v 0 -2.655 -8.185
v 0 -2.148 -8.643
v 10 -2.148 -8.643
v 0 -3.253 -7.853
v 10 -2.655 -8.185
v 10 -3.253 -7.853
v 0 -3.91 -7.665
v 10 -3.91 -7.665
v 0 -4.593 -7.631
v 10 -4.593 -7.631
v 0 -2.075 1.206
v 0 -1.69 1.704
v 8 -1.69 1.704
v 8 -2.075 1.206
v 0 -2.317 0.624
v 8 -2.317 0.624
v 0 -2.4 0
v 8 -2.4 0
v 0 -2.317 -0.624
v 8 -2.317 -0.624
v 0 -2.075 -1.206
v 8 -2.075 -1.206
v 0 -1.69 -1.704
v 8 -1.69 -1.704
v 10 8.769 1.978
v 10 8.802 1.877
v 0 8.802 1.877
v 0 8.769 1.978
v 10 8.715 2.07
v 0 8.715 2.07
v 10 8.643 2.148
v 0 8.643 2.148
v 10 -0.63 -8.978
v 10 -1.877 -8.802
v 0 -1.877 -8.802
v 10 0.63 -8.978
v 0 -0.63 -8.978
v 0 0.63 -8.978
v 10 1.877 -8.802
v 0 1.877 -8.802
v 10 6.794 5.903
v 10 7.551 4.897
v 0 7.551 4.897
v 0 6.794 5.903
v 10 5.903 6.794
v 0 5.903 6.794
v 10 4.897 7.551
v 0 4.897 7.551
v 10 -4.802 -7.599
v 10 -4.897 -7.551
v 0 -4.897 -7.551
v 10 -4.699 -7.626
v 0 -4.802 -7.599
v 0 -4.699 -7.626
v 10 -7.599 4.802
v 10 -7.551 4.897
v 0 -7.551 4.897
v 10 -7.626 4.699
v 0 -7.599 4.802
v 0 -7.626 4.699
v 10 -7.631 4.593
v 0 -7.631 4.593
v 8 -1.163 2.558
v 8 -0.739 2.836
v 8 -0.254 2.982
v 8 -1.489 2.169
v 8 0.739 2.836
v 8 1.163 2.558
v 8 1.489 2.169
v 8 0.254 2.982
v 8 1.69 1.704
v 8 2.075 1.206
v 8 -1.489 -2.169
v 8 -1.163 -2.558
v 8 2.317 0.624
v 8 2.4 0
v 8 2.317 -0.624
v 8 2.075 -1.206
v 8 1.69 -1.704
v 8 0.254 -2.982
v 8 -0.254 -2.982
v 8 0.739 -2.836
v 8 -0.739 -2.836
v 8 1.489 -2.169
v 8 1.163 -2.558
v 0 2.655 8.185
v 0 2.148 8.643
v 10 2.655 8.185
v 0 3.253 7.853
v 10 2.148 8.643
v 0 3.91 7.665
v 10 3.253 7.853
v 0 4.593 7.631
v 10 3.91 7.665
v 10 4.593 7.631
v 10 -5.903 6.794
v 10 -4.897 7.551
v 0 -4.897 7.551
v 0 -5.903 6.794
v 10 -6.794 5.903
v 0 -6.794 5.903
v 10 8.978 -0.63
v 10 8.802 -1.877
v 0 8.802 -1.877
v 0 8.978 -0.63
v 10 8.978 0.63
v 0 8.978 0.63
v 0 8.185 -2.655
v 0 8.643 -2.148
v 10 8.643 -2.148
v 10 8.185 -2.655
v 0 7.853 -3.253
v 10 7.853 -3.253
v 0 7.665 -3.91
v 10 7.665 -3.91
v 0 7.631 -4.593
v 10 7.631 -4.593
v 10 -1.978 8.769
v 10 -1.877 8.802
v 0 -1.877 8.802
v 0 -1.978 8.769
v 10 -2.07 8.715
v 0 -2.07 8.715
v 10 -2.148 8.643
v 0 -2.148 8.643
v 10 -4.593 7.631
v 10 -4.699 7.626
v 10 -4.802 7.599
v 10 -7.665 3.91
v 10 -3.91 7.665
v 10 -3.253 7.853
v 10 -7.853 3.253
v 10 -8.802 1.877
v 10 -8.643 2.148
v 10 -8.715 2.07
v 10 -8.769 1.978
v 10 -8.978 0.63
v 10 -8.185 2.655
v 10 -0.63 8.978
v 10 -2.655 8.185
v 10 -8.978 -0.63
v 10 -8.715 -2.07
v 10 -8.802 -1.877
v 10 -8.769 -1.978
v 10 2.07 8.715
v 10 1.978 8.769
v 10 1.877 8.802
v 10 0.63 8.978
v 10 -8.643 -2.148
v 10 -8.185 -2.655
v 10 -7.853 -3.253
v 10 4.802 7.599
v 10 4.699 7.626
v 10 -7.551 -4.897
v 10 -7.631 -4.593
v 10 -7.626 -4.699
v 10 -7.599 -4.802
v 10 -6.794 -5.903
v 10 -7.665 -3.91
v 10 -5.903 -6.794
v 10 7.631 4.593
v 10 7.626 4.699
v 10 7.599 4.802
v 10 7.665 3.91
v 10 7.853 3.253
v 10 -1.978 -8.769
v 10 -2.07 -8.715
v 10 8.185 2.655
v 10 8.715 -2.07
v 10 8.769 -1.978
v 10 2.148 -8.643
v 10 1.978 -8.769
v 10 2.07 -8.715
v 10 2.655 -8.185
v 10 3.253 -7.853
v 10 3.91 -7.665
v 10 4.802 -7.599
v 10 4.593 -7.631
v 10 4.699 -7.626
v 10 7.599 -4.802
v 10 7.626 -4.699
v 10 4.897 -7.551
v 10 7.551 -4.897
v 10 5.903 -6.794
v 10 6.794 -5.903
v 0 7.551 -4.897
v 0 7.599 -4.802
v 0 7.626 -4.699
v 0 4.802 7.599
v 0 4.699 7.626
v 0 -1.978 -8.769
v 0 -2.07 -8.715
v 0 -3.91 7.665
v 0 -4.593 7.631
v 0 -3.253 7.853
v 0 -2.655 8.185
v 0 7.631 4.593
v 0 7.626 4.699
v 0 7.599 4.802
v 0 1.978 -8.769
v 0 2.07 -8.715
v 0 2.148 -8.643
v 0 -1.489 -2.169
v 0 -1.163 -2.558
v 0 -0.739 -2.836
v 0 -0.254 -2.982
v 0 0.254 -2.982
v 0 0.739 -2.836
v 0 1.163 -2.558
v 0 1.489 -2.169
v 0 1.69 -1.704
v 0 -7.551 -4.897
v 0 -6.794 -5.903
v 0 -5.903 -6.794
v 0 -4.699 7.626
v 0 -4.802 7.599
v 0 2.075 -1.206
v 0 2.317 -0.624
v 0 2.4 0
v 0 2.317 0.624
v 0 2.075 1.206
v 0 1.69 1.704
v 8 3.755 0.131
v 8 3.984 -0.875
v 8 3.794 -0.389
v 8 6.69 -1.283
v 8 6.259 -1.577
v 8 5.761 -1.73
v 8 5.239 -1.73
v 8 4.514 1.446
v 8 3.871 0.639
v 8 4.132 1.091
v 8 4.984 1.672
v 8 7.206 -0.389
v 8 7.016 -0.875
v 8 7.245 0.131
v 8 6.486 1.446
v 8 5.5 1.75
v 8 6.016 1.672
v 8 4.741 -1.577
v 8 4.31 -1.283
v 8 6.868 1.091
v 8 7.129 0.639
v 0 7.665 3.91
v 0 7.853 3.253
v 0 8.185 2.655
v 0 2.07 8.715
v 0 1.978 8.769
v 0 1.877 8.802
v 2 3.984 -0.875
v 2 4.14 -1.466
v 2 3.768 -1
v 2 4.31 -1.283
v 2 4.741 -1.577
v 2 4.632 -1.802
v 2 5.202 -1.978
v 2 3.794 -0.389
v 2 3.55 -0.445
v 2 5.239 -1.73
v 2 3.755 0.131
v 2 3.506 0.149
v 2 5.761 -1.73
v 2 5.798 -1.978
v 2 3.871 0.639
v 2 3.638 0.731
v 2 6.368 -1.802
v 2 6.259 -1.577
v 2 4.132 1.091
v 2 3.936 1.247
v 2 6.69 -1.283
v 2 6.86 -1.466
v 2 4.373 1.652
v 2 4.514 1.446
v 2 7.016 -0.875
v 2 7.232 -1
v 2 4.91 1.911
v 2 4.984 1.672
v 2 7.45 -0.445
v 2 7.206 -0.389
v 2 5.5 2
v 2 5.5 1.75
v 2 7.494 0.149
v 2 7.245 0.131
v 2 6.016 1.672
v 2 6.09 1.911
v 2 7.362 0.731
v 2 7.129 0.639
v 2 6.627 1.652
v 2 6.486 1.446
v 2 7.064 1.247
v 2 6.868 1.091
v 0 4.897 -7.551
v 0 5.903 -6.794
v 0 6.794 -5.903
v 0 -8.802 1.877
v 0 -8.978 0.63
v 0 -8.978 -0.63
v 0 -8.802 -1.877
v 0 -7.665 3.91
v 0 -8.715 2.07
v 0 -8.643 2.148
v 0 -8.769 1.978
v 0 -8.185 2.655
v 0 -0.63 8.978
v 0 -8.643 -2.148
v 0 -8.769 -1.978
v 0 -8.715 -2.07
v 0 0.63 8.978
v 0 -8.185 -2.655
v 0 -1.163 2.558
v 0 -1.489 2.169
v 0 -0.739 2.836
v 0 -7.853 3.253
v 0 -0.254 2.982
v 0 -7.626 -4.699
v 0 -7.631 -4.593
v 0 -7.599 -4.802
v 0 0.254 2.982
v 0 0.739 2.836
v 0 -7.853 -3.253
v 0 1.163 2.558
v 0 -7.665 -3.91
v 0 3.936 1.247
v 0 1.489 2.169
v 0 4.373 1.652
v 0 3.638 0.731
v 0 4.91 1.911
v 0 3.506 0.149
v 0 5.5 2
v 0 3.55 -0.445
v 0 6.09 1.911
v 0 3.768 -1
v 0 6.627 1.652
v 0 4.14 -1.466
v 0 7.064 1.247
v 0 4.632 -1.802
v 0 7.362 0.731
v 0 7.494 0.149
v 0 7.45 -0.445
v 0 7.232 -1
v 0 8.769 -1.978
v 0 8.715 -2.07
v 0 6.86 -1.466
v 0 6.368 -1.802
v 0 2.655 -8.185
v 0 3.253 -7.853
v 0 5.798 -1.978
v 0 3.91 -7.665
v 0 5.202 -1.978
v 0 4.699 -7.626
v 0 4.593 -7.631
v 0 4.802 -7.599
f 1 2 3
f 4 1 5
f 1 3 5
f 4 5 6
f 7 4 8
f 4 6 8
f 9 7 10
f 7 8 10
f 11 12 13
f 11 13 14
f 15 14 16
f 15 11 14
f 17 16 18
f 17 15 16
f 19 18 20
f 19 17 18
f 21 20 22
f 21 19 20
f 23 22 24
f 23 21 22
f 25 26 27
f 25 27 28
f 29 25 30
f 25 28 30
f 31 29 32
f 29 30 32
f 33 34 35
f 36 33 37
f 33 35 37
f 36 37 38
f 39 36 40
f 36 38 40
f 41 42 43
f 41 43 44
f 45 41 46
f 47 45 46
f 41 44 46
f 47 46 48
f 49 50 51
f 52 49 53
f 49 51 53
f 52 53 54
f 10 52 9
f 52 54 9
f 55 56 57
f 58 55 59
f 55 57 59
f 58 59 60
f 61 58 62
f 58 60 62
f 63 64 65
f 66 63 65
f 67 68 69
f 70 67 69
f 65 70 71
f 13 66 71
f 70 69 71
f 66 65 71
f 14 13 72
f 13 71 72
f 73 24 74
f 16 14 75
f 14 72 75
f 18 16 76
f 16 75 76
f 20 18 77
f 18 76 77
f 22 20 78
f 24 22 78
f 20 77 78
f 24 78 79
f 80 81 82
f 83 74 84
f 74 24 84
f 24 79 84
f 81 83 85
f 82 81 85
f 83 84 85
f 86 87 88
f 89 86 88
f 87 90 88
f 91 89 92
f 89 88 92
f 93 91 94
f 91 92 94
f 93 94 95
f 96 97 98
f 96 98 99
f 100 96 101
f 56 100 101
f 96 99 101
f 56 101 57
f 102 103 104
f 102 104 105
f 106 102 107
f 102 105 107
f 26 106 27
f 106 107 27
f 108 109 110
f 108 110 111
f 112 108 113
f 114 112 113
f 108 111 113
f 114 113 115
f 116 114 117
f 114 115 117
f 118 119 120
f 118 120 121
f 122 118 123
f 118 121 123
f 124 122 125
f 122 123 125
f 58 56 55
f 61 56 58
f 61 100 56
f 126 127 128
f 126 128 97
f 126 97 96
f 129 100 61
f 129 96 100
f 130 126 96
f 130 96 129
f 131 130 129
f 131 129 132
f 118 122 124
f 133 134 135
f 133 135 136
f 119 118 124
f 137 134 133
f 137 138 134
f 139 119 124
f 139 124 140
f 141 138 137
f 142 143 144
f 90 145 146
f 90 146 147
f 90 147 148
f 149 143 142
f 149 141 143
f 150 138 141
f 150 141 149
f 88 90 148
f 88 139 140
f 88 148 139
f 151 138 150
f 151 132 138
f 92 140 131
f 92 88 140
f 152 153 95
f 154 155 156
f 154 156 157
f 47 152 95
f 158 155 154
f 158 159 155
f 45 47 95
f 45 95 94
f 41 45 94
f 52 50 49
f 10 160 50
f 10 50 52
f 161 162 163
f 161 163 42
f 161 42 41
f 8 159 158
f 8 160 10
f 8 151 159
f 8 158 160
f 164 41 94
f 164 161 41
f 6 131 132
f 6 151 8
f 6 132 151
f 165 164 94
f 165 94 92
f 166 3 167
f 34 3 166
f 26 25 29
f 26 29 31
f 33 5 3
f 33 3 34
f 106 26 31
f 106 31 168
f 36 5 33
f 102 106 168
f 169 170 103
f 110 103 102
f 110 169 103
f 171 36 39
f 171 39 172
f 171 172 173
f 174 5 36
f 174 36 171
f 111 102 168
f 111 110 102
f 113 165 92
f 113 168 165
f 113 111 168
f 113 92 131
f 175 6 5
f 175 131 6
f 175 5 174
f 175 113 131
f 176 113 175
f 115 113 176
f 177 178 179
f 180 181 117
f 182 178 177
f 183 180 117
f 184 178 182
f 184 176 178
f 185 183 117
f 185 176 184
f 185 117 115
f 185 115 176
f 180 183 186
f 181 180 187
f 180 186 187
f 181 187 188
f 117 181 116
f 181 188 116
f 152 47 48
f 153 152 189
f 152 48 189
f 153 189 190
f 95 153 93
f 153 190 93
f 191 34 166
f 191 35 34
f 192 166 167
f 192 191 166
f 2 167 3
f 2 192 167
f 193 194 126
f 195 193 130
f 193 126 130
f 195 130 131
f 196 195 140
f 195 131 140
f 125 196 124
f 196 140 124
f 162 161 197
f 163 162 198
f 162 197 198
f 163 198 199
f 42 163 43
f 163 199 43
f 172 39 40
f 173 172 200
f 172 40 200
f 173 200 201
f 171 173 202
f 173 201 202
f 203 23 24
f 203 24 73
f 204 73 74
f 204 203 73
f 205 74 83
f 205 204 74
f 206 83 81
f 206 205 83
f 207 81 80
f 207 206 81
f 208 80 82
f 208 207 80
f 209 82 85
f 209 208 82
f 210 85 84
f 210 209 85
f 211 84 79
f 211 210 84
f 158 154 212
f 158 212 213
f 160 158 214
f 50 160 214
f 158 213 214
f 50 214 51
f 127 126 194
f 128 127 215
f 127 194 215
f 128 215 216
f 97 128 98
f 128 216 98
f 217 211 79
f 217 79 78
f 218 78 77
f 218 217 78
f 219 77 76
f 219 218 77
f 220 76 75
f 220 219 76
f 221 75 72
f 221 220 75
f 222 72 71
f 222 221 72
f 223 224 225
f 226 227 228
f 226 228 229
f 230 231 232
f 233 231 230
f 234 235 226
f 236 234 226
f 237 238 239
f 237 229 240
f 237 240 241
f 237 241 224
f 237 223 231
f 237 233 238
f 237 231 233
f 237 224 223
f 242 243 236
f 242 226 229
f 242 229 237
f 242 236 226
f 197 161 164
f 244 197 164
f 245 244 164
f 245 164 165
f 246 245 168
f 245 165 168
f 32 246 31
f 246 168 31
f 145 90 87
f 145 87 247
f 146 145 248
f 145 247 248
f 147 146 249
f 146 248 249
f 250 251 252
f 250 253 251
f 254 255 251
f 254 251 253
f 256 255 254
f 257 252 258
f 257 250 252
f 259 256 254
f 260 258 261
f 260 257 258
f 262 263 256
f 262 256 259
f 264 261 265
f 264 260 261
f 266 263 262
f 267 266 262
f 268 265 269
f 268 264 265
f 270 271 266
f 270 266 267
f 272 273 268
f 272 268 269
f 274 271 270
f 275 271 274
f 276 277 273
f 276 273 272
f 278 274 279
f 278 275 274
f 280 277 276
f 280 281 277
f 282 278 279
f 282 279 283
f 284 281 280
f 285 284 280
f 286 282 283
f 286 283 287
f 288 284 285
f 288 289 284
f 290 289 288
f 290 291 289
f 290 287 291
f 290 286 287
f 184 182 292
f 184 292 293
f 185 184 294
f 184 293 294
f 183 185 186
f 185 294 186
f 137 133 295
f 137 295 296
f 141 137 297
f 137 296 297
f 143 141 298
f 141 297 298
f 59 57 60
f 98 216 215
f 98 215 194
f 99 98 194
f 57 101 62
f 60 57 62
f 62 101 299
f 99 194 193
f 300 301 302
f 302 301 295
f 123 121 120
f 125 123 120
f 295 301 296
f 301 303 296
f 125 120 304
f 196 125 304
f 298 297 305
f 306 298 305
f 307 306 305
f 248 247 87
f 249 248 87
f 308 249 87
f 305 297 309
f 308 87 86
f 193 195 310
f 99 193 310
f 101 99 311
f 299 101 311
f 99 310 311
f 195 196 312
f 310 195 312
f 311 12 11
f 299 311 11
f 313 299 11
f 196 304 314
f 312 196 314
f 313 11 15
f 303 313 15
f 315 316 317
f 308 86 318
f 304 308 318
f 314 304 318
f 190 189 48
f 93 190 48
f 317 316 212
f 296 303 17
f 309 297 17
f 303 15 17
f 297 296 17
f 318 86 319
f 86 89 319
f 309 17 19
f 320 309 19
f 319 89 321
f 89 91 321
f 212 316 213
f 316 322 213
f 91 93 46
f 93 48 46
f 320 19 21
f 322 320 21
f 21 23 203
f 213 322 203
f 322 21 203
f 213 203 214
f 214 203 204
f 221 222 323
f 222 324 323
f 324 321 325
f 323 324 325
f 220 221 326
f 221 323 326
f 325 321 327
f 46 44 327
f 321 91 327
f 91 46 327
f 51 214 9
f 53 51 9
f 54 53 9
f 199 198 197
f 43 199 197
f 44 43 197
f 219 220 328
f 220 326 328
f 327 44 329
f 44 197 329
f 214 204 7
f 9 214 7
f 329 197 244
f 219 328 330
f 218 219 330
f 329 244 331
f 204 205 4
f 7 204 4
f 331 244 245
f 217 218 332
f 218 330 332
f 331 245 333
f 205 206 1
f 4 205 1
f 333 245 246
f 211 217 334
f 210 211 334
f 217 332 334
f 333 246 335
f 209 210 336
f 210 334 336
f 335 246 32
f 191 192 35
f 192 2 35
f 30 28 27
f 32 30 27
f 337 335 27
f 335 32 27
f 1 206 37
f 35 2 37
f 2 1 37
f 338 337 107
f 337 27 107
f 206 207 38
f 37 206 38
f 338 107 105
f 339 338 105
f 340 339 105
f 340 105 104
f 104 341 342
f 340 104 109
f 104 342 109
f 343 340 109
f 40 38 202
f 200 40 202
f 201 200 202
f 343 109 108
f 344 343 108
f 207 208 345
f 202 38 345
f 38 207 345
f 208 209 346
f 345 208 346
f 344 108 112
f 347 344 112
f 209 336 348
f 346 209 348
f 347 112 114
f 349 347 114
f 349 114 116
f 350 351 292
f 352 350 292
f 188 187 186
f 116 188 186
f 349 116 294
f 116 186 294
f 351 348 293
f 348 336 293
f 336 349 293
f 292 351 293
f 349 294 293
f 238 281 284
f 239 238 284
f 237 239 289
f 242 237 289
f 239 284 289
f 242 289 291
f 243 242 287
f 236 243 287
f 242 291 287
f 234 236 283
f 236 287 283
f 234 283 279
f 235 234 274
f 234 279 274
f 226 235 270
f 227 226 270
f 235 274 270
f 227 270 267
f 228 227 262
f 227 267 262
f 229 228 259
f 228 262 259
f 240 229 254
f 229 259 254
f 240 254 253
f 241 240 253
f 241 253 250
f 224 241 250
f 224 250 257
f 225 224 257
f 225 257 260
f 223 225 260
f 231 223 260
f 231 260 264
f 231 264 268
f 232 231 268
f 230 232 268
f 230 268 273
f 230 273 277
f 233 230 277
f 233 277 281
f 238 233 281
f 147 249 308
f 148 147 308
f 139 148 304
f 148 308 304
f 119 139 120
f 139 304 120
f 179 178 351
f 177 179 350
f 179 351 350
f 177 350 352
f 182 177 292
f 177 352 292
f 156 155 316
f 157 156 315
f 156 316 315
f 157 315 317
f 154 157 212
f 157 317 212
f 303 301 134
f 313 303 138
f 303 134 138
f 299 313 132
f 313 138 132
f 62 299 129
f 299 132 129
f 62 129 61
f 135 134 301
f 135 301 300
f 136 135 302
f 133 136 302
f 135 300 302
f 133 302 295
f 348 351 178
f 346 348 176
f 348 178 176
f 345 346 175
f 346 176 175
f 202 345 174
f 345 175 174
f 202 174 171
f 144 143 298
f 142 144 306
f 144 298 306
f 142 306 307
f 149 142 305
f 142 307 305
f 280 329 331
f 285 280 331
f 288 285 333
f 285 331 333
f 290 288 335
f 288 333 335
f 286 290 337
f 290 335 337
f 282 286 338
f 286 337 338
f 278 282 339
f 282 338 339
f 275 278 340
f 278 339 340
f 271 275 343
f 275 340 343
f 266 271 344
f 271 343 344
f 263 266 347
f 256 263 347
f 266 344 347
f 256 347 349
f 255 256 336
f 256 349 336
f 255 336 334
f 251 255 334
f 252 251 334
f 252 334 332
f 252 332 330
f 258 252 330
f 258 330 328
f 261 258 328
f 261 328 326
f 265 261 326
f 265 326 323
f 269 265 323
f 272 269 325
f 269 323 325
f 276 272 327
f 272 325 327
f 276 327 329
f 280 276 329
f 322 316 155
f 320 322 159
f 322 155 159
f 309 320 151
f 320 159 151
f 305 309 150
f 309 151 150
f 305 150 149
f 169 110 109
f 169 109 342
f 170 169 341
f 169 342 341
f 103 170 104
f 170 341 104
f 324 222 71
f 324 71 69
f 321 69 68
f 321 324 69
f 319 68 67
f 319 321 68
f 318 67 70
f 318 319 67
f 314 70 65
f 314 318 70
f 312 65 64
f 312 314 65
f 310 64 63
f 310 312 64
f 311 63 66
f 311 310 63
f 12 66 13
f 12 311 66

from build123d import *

# Parameters (mm, degrees)
SKETCH1_R           = 9
BOSS_EXTRUDE1_DEPTH = 8
SKETCH2_R           = 9
BOSS_EXTRUDE2_DEPTH = 2
SKETCH3_R           = 3
CUT_EXTRUDE1_DEPTH  = 17.186414056
FILLET3_R           = 0.5
SKETCH4_R           = 1.75
CUT_EXTRUDE2_DEPTH  = 8
SKETCH5_R           = 2
CUT_EXTRUDE3_DEPTH  = 2


with BuildPart() as part:
    # Sketch1 → Boss-Extrude1 (new body)
    with BuildSketch(Plane(origin=(0, 0, 0), x_dir=(0, 0, -1), z_dir=(1, 0, 0))):
        Circle(SKETCH1_R)
        with BuildLine():
            ThreePointArc((1.704, 1.690084022), (0, 2.4), (-1.704, 1.690084022))
            ThreePointArc((-1.704, 1.690084022), (-3, 0), (-1.704, -1.690084022))
            ThreePointArc((-1.704, -1.690084022), (0, -2.4), (1.704, -1.690084022))
            ThreePointArc((1.704, -1.690084022), (3, 0), (1.704, 1.690084022))
        make_face(mode=Mode.SUBTRACT)
    extrude(amount=BOSS_EXTRUDE1_DEPTH)

    # Sketch2 → Boss-Extrude2 (add)
    with BuildSketch(Plane(origin=(8, 0, 0), x_dir=(0, 0, -1), z_dir=(1, 0, 0))):
        Circle(SKETCH2_R)
    extrude(amount=BOSS_EXTRUDE2_DEPTH)

    # Sketch3 → Cut-Extrude1 (cut, through all)
    with BuildSketch(Plane(origin=(10, 0, 0), x_dir=(0, 0, -1), z_dir=(1, 0, 0))):
        with Locations((-4.400859472, 10.624614624)):
            Circle(SKETCH3_R)
        with Locations((4.400859472, 10.624614624)):
            Circle(SKETCH3_R)
        with Locations((10.624614624, 4.400859472)):
            Circle(SKETCH3_R)
        with Locations((4.400859472, -10.624614624)):
            Circle(SKETCH3_R)
        with Locations((-10.624614624, -4.400859472)):
            Circle(SKETCH3_R)
        with Locations((-10.624614624, 4.400859472)):
            Circle(SKETCH3_R)
        with Locations((-4.400859472, -10.624614624)):
            Circle(SKETCH3_R)
        with Locations((10.624614624, -4.400859472)):
            Circle(SKETCH3_R)
    extrude(amount=-CUT_EXTRUDE1_DEPTH, mode=Mode.SUBTRACT)

    # Fillet3
    fillet3_edges = [part.edges().sort_by_distance(p)[0] for p in [
        (5, 8.763991921, 2.047546243),
        (5, 7.64491195, 4.749244284),
        (5, 2.047546243, -8.763991921),
        (5, 4.749244284, -7.64491195),
        (5, -8.763991921, -2.047546243),
        (5, -7.64491195, -4.749244284),
        (5, -2.047546243, 8.763991921),
        (5, -4.749244284, 7.64491195),
        (5, 7.64491195, -4.749244284),
        (5, 8.763991921, -2.047546243),
        (5, 4.749244284, 7.64491195),
        (5, 2.047546243, 8.763991921),
        (5, -7.64491195, 4.749244284),
        (5, -8.763991921, 2.047546243),
        (5, -4.749244284, -7.64491195),
        (5, -2.047546243, -8.763991921),
    ]]
    fillet(fillet3_edges, radius=FILLET3_R)

    # Sketch4 → Cut-Extrude2 (cut)
    with BuildSketch(Plane.ZY):
        with Locations((0, 5.5)):
            Circle(SKETCH4_R)
    extrude(amount=-CUT_EXTRUDE2_DEPTH, mode=Mode.SUBTRACT)

    # Sketch5 → Cut-Extrude3 (cut)
    with BuildSketch(Plane.ZY):
        with Locations((0, 5.5)):
            Circle(SKETCH5_R)
    extrude(amount=-CUT_EXTRUDE3_DEPTH, mode=Mode.SUBTRACT)


solid = part.part
